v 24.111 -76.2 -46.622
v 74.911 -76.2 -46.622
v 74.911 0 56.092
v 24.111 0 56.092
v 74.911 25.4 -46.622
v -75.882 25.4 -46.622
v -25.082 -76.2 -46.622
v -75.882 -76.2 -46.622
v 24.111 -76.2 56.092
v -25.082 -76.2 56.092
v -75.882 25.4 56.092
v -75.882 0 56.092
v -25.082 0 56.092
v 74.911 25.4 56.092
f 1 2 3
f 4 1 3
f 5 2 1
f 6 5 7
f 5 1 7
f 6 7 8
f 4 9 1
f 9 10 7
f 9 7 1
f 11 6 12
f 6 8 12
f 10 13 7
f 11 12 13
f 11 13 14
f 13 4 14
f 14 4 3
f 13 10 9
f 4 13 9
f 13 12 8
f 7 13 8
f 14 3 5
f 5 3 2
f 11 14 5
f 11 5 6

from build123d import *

# Parameters (mm, degrees)
F0_W     = 150.792748
F0_H     = 102.713902
F1_DEPTH = 76.2
F3_DEPTH = 50.8
F5_DEPTH = 50.8
F7_DEPTH = 25.4


with BuildPart() as f1:
    # F0 (on Front) → F1 (new body)
    with BuildSketch(Plane.XZ):
        with Locations((-0.485644, 4.735036)):
            Rectangle(F0_W, F0_H)
    extrude(amount=F1_DEPTH)

    # F2 (on face) → F3 (cut)
    with BuildSketch(Plane.YZ.offset(74.91073)):
        Polygon((-76.2, 56.091987), (-76.2, -46.621915), (0, 56.091987), align=None)
    extrude(amount=-F3_DEPTH, mode=Mode.SUBTRACT)

    # F4 (on face) → F5 (cut)
    with BuildSketch(Plane(origin=(-75.882018, 0, 0), x_dir=(0, -1, 0), z_dir=(-1, 0, 0))):
        Polygon((76.2, 56.091987), (0, 56.091987), (76.2, -46.621915), align=None)
    extrude(amount=-F5_DEPTH, mode=Mode.SUBTRACT)

    # F6 (on face) → F7 (join)
    with BuildSketch(Plane(origin=(0, 0, 0), x_dir=(-1, 0, 0), z_dir=(0, 1, 0))):
        Polygon((-24.11073, 56.091987), (-74.91073, 56.091987), (-74.91073, -46.621915), (75.882018, -46.621915), (75.882018, 56.091987), (25.082018, 56.091987), align=None)
    extrude(amount=F7_DEPTH)


solid = f1.part
